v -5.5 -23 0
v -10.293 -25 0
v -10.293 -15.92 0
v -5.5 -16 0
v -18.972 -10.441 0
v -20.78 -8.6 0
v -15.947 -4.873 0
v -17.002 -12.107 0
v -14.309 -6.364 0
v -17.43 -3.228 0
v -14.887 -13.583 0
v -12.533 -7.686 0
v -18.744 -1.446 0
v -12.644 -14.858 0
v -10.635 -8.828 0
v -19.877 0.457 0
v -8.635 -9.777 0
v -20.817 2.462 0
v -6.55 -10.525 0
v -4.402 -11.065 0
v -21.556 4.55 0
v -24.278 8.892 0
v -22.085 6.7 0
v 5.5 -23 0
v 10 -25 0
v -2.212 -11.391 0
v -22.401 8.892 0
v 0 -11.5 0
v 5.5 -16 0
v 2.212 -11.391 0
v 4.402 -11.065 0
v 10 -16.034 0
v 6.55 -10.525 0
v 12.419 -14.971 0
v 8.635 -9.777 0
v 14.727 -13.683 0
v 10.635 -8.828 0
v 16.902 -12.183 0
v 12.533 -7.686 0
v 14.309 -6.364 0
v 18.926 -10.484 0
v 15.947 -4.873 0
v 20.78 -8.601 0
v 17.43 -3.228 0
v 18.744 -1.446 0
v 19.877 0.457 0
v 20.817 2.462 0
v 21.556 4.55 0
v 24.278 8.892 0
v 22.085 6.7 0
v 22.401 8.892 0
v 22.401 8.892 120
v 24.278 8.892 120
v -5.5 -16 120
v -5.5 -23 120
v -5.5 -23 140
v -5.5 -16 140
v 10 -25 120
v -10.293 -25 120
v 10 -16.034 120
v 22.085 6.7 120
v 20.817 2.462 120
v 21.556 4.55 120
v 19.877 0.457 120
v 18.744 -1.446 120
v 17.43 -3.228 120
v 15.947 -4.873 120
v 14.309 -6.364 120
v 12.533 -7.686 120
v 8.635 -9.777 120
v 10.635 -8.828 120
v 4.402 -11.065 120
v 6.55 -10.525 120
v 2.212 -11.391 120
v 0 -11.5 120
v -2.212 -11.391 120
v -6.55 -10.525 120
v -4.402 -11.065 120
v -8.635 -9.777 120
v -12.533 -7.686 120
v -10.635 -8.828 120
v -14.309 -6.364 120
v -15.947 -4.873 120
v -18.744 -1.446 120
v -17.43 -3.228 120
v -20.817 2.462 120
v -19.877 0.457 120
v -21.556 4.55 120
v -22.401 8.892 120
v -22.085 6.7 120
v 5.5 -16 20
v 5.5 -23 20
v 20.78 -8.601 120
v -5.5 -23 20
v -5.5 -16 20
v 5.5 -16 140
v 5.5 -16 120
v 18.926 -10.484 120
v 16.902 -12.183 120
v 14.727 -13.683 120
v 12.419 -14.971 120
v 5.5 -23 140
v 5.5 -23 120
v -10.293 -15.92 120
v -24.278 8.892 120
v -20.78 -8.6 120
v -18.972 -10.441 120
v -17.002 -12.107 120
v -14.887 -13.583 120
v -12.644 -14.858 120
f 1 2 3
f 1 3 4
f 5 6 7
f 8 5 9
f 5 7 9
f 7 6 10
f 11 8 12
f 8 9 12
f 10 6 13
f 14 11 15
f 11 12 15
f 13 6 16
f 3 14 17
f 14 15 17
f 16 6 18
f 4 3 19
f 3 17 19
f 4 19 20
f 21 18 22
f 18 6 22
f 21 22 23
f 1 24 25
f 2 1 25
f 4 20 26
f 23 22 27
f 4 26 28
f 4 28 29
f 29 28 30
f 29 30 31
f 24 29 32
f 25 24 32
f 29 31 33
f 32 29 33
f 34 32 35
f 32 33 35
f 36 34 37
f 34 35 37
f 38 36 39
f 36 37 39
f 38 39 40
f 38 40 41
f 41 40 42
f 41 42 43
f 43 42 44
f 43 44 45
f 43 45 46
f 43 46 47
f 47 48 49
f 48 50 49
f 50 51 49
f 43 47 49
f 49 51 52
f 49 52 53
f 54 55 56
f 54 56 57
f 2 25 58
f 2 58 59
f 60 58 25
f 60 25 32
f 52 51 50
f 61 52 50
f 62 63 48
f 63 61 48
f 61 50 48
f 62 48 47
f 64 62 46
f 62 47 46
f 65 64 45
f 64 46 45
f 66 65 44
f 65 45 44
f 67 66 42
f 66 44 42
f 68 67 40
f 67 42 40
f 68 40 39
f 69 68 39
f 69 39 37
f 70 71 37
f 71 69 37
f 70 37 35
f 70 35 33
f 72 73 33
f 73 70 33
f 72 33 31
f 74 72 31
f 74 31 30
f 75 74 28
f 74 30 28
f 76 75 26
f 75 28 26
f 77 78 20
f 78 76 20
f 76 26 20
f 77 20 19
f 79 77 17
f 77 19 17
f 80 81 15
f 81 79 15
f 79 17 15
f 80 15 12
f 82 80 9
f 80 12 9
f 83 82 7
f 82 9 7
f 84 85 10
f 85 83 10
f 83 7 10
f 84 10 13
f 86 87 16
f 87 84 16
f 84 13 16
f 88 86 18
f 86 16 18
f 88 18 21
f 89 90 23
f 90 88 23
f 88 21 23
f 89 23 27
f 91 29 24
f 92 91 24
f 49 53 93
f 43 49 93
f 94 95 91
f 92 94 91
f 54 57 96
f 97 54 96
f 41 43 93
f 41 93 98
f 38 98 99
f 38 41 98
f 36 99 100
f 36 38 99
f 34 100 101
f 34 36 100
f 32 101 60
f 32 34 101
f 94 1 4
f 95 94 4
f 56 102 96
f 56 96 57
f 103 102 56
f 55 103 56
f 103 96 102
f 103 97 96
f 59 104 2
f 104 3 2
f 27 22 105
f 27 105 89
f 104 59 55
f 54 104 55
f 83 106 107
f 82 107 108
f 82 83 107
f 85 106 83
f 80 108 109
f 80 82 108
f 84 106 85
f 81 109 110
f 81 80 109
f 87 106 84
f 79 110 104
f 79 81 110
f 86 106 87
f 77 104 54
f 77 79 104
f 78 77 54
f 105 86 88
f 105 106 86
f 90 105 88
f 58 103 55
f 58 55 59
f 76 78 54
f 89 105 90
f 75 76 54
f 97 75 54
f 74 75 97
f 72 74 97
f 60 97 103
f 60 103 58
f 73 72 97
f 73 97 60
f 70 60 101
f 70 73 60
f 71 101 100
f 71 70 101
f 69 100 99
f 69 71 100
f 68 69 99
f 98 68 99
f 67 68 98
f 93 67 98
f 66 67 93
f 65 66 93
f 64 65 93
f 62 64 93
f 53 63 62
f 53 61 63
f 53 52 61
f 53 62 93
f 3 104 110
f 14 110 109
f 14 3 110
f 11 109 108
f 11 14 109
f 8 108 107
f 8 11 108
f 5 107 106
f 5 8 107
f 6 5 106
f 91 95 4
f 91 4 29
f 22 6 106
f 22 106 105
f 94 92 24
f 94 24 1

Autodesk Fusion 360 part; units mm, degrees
sketch "Sketch1" plane through (0, 0, 0) normal (0, 0, 1) x (1, 0, 0)
  line L0 (17.5, -25) -> (-17.5, -25)
  line L1 (5.5, -23) -> (-5.5, -23)
  line L2 (-5.5, -23) -> (-5.5, -16)
  line L3 (-5.5, -16) -> (5.5, -16)
  line L4 (5.5, -16) -> (5.5, -23)
  line L5 (-24.2785, 8.8924) -> (-22.4011, 8.8924)
  line L6 (-17.5, -25) -> (-24.2785, 8.8924)
  line L7 (22.4011, 8.8924) -> (24.2781, 8.8924)
  line L8 (24.2781, 8.8924) -> (17.5, -25)
  arc A0 (-22.4011, 8.8924) -> (22.4011, 8.8924) centre (0, 11) ccw
  dimension "d4" = 45
  dimension "d5" = 1.877
extrude "Extrude1" add sketch "Sketch1" along normal blind 120
extrude "Extrude2" add sketch "Sketch1" along normal blind 120 contours L1 L2 L3 L4
extrude "Extrude3" cut sketch "Sketch1" along normal blind 20 contours L1 L2 L3 L4
sketch "Sketch2" plane through (0, 0, 120) normal (0, 0, 1) x (-1, 0, 0)
  line L0 (22.4011, -8.8924) -> (24.2785, -8.8924)
  line L1 (24.2785, -8.8924) -> (17.5, 25)
  line L2 (17.5, 25) -> (-17.5, 25)
  line L3 (-17.5, 25) -> (-24.2781, -8.8924)
  line L4 (-24.2781, -8.8924) -> (-22.4011, -8.8924)
  arc A0 (22.4011, -8.8924) -> (-22.4011, -8.8924) centre (0, -11) ccw
  line L5 (-5.5, 23) -> (5.5, 23)
  line L6 (5.5, 23) -> (5.5, 16)
  line L7 (5.5, 16) -> (-5.5, 16)
  line L8 (-5.5, 16) -> (-5.5, 23)
extrude "Extrude4" add sketch "Sketch2" along normal blind 20 contours L5 L6 L7 L8
sketch "Sketch3" plane through (0, 0, 0) normal (0, 0, 1) x (1, 0, 0)
  circle A0 centre (0, 10) radius 27.8887
  line L0 (-10.2931, -15.9198) -> (-10.2931, -26.4867)
  line L1 (-10.2931, -26.4867) -> (10, -26.4867)
  line L2 (10, -26.4867) -> (10, -16.0342)
  line L3 (-10.2931, -26.4867) -> (-25, -26.4867)
  line L4 (-25, -26.4867) -> (-25, -2.3605)
  line L5 (10, -26.4867) -> (25, -26.4867)
  line L6 (25, -26.4867) -> (25, -2.3605)
extrude "Extrude5" cut sketch "Sketch3" along normal blind 135 contours A0 L0 L3 L4 | A0 L2 L5 L6
